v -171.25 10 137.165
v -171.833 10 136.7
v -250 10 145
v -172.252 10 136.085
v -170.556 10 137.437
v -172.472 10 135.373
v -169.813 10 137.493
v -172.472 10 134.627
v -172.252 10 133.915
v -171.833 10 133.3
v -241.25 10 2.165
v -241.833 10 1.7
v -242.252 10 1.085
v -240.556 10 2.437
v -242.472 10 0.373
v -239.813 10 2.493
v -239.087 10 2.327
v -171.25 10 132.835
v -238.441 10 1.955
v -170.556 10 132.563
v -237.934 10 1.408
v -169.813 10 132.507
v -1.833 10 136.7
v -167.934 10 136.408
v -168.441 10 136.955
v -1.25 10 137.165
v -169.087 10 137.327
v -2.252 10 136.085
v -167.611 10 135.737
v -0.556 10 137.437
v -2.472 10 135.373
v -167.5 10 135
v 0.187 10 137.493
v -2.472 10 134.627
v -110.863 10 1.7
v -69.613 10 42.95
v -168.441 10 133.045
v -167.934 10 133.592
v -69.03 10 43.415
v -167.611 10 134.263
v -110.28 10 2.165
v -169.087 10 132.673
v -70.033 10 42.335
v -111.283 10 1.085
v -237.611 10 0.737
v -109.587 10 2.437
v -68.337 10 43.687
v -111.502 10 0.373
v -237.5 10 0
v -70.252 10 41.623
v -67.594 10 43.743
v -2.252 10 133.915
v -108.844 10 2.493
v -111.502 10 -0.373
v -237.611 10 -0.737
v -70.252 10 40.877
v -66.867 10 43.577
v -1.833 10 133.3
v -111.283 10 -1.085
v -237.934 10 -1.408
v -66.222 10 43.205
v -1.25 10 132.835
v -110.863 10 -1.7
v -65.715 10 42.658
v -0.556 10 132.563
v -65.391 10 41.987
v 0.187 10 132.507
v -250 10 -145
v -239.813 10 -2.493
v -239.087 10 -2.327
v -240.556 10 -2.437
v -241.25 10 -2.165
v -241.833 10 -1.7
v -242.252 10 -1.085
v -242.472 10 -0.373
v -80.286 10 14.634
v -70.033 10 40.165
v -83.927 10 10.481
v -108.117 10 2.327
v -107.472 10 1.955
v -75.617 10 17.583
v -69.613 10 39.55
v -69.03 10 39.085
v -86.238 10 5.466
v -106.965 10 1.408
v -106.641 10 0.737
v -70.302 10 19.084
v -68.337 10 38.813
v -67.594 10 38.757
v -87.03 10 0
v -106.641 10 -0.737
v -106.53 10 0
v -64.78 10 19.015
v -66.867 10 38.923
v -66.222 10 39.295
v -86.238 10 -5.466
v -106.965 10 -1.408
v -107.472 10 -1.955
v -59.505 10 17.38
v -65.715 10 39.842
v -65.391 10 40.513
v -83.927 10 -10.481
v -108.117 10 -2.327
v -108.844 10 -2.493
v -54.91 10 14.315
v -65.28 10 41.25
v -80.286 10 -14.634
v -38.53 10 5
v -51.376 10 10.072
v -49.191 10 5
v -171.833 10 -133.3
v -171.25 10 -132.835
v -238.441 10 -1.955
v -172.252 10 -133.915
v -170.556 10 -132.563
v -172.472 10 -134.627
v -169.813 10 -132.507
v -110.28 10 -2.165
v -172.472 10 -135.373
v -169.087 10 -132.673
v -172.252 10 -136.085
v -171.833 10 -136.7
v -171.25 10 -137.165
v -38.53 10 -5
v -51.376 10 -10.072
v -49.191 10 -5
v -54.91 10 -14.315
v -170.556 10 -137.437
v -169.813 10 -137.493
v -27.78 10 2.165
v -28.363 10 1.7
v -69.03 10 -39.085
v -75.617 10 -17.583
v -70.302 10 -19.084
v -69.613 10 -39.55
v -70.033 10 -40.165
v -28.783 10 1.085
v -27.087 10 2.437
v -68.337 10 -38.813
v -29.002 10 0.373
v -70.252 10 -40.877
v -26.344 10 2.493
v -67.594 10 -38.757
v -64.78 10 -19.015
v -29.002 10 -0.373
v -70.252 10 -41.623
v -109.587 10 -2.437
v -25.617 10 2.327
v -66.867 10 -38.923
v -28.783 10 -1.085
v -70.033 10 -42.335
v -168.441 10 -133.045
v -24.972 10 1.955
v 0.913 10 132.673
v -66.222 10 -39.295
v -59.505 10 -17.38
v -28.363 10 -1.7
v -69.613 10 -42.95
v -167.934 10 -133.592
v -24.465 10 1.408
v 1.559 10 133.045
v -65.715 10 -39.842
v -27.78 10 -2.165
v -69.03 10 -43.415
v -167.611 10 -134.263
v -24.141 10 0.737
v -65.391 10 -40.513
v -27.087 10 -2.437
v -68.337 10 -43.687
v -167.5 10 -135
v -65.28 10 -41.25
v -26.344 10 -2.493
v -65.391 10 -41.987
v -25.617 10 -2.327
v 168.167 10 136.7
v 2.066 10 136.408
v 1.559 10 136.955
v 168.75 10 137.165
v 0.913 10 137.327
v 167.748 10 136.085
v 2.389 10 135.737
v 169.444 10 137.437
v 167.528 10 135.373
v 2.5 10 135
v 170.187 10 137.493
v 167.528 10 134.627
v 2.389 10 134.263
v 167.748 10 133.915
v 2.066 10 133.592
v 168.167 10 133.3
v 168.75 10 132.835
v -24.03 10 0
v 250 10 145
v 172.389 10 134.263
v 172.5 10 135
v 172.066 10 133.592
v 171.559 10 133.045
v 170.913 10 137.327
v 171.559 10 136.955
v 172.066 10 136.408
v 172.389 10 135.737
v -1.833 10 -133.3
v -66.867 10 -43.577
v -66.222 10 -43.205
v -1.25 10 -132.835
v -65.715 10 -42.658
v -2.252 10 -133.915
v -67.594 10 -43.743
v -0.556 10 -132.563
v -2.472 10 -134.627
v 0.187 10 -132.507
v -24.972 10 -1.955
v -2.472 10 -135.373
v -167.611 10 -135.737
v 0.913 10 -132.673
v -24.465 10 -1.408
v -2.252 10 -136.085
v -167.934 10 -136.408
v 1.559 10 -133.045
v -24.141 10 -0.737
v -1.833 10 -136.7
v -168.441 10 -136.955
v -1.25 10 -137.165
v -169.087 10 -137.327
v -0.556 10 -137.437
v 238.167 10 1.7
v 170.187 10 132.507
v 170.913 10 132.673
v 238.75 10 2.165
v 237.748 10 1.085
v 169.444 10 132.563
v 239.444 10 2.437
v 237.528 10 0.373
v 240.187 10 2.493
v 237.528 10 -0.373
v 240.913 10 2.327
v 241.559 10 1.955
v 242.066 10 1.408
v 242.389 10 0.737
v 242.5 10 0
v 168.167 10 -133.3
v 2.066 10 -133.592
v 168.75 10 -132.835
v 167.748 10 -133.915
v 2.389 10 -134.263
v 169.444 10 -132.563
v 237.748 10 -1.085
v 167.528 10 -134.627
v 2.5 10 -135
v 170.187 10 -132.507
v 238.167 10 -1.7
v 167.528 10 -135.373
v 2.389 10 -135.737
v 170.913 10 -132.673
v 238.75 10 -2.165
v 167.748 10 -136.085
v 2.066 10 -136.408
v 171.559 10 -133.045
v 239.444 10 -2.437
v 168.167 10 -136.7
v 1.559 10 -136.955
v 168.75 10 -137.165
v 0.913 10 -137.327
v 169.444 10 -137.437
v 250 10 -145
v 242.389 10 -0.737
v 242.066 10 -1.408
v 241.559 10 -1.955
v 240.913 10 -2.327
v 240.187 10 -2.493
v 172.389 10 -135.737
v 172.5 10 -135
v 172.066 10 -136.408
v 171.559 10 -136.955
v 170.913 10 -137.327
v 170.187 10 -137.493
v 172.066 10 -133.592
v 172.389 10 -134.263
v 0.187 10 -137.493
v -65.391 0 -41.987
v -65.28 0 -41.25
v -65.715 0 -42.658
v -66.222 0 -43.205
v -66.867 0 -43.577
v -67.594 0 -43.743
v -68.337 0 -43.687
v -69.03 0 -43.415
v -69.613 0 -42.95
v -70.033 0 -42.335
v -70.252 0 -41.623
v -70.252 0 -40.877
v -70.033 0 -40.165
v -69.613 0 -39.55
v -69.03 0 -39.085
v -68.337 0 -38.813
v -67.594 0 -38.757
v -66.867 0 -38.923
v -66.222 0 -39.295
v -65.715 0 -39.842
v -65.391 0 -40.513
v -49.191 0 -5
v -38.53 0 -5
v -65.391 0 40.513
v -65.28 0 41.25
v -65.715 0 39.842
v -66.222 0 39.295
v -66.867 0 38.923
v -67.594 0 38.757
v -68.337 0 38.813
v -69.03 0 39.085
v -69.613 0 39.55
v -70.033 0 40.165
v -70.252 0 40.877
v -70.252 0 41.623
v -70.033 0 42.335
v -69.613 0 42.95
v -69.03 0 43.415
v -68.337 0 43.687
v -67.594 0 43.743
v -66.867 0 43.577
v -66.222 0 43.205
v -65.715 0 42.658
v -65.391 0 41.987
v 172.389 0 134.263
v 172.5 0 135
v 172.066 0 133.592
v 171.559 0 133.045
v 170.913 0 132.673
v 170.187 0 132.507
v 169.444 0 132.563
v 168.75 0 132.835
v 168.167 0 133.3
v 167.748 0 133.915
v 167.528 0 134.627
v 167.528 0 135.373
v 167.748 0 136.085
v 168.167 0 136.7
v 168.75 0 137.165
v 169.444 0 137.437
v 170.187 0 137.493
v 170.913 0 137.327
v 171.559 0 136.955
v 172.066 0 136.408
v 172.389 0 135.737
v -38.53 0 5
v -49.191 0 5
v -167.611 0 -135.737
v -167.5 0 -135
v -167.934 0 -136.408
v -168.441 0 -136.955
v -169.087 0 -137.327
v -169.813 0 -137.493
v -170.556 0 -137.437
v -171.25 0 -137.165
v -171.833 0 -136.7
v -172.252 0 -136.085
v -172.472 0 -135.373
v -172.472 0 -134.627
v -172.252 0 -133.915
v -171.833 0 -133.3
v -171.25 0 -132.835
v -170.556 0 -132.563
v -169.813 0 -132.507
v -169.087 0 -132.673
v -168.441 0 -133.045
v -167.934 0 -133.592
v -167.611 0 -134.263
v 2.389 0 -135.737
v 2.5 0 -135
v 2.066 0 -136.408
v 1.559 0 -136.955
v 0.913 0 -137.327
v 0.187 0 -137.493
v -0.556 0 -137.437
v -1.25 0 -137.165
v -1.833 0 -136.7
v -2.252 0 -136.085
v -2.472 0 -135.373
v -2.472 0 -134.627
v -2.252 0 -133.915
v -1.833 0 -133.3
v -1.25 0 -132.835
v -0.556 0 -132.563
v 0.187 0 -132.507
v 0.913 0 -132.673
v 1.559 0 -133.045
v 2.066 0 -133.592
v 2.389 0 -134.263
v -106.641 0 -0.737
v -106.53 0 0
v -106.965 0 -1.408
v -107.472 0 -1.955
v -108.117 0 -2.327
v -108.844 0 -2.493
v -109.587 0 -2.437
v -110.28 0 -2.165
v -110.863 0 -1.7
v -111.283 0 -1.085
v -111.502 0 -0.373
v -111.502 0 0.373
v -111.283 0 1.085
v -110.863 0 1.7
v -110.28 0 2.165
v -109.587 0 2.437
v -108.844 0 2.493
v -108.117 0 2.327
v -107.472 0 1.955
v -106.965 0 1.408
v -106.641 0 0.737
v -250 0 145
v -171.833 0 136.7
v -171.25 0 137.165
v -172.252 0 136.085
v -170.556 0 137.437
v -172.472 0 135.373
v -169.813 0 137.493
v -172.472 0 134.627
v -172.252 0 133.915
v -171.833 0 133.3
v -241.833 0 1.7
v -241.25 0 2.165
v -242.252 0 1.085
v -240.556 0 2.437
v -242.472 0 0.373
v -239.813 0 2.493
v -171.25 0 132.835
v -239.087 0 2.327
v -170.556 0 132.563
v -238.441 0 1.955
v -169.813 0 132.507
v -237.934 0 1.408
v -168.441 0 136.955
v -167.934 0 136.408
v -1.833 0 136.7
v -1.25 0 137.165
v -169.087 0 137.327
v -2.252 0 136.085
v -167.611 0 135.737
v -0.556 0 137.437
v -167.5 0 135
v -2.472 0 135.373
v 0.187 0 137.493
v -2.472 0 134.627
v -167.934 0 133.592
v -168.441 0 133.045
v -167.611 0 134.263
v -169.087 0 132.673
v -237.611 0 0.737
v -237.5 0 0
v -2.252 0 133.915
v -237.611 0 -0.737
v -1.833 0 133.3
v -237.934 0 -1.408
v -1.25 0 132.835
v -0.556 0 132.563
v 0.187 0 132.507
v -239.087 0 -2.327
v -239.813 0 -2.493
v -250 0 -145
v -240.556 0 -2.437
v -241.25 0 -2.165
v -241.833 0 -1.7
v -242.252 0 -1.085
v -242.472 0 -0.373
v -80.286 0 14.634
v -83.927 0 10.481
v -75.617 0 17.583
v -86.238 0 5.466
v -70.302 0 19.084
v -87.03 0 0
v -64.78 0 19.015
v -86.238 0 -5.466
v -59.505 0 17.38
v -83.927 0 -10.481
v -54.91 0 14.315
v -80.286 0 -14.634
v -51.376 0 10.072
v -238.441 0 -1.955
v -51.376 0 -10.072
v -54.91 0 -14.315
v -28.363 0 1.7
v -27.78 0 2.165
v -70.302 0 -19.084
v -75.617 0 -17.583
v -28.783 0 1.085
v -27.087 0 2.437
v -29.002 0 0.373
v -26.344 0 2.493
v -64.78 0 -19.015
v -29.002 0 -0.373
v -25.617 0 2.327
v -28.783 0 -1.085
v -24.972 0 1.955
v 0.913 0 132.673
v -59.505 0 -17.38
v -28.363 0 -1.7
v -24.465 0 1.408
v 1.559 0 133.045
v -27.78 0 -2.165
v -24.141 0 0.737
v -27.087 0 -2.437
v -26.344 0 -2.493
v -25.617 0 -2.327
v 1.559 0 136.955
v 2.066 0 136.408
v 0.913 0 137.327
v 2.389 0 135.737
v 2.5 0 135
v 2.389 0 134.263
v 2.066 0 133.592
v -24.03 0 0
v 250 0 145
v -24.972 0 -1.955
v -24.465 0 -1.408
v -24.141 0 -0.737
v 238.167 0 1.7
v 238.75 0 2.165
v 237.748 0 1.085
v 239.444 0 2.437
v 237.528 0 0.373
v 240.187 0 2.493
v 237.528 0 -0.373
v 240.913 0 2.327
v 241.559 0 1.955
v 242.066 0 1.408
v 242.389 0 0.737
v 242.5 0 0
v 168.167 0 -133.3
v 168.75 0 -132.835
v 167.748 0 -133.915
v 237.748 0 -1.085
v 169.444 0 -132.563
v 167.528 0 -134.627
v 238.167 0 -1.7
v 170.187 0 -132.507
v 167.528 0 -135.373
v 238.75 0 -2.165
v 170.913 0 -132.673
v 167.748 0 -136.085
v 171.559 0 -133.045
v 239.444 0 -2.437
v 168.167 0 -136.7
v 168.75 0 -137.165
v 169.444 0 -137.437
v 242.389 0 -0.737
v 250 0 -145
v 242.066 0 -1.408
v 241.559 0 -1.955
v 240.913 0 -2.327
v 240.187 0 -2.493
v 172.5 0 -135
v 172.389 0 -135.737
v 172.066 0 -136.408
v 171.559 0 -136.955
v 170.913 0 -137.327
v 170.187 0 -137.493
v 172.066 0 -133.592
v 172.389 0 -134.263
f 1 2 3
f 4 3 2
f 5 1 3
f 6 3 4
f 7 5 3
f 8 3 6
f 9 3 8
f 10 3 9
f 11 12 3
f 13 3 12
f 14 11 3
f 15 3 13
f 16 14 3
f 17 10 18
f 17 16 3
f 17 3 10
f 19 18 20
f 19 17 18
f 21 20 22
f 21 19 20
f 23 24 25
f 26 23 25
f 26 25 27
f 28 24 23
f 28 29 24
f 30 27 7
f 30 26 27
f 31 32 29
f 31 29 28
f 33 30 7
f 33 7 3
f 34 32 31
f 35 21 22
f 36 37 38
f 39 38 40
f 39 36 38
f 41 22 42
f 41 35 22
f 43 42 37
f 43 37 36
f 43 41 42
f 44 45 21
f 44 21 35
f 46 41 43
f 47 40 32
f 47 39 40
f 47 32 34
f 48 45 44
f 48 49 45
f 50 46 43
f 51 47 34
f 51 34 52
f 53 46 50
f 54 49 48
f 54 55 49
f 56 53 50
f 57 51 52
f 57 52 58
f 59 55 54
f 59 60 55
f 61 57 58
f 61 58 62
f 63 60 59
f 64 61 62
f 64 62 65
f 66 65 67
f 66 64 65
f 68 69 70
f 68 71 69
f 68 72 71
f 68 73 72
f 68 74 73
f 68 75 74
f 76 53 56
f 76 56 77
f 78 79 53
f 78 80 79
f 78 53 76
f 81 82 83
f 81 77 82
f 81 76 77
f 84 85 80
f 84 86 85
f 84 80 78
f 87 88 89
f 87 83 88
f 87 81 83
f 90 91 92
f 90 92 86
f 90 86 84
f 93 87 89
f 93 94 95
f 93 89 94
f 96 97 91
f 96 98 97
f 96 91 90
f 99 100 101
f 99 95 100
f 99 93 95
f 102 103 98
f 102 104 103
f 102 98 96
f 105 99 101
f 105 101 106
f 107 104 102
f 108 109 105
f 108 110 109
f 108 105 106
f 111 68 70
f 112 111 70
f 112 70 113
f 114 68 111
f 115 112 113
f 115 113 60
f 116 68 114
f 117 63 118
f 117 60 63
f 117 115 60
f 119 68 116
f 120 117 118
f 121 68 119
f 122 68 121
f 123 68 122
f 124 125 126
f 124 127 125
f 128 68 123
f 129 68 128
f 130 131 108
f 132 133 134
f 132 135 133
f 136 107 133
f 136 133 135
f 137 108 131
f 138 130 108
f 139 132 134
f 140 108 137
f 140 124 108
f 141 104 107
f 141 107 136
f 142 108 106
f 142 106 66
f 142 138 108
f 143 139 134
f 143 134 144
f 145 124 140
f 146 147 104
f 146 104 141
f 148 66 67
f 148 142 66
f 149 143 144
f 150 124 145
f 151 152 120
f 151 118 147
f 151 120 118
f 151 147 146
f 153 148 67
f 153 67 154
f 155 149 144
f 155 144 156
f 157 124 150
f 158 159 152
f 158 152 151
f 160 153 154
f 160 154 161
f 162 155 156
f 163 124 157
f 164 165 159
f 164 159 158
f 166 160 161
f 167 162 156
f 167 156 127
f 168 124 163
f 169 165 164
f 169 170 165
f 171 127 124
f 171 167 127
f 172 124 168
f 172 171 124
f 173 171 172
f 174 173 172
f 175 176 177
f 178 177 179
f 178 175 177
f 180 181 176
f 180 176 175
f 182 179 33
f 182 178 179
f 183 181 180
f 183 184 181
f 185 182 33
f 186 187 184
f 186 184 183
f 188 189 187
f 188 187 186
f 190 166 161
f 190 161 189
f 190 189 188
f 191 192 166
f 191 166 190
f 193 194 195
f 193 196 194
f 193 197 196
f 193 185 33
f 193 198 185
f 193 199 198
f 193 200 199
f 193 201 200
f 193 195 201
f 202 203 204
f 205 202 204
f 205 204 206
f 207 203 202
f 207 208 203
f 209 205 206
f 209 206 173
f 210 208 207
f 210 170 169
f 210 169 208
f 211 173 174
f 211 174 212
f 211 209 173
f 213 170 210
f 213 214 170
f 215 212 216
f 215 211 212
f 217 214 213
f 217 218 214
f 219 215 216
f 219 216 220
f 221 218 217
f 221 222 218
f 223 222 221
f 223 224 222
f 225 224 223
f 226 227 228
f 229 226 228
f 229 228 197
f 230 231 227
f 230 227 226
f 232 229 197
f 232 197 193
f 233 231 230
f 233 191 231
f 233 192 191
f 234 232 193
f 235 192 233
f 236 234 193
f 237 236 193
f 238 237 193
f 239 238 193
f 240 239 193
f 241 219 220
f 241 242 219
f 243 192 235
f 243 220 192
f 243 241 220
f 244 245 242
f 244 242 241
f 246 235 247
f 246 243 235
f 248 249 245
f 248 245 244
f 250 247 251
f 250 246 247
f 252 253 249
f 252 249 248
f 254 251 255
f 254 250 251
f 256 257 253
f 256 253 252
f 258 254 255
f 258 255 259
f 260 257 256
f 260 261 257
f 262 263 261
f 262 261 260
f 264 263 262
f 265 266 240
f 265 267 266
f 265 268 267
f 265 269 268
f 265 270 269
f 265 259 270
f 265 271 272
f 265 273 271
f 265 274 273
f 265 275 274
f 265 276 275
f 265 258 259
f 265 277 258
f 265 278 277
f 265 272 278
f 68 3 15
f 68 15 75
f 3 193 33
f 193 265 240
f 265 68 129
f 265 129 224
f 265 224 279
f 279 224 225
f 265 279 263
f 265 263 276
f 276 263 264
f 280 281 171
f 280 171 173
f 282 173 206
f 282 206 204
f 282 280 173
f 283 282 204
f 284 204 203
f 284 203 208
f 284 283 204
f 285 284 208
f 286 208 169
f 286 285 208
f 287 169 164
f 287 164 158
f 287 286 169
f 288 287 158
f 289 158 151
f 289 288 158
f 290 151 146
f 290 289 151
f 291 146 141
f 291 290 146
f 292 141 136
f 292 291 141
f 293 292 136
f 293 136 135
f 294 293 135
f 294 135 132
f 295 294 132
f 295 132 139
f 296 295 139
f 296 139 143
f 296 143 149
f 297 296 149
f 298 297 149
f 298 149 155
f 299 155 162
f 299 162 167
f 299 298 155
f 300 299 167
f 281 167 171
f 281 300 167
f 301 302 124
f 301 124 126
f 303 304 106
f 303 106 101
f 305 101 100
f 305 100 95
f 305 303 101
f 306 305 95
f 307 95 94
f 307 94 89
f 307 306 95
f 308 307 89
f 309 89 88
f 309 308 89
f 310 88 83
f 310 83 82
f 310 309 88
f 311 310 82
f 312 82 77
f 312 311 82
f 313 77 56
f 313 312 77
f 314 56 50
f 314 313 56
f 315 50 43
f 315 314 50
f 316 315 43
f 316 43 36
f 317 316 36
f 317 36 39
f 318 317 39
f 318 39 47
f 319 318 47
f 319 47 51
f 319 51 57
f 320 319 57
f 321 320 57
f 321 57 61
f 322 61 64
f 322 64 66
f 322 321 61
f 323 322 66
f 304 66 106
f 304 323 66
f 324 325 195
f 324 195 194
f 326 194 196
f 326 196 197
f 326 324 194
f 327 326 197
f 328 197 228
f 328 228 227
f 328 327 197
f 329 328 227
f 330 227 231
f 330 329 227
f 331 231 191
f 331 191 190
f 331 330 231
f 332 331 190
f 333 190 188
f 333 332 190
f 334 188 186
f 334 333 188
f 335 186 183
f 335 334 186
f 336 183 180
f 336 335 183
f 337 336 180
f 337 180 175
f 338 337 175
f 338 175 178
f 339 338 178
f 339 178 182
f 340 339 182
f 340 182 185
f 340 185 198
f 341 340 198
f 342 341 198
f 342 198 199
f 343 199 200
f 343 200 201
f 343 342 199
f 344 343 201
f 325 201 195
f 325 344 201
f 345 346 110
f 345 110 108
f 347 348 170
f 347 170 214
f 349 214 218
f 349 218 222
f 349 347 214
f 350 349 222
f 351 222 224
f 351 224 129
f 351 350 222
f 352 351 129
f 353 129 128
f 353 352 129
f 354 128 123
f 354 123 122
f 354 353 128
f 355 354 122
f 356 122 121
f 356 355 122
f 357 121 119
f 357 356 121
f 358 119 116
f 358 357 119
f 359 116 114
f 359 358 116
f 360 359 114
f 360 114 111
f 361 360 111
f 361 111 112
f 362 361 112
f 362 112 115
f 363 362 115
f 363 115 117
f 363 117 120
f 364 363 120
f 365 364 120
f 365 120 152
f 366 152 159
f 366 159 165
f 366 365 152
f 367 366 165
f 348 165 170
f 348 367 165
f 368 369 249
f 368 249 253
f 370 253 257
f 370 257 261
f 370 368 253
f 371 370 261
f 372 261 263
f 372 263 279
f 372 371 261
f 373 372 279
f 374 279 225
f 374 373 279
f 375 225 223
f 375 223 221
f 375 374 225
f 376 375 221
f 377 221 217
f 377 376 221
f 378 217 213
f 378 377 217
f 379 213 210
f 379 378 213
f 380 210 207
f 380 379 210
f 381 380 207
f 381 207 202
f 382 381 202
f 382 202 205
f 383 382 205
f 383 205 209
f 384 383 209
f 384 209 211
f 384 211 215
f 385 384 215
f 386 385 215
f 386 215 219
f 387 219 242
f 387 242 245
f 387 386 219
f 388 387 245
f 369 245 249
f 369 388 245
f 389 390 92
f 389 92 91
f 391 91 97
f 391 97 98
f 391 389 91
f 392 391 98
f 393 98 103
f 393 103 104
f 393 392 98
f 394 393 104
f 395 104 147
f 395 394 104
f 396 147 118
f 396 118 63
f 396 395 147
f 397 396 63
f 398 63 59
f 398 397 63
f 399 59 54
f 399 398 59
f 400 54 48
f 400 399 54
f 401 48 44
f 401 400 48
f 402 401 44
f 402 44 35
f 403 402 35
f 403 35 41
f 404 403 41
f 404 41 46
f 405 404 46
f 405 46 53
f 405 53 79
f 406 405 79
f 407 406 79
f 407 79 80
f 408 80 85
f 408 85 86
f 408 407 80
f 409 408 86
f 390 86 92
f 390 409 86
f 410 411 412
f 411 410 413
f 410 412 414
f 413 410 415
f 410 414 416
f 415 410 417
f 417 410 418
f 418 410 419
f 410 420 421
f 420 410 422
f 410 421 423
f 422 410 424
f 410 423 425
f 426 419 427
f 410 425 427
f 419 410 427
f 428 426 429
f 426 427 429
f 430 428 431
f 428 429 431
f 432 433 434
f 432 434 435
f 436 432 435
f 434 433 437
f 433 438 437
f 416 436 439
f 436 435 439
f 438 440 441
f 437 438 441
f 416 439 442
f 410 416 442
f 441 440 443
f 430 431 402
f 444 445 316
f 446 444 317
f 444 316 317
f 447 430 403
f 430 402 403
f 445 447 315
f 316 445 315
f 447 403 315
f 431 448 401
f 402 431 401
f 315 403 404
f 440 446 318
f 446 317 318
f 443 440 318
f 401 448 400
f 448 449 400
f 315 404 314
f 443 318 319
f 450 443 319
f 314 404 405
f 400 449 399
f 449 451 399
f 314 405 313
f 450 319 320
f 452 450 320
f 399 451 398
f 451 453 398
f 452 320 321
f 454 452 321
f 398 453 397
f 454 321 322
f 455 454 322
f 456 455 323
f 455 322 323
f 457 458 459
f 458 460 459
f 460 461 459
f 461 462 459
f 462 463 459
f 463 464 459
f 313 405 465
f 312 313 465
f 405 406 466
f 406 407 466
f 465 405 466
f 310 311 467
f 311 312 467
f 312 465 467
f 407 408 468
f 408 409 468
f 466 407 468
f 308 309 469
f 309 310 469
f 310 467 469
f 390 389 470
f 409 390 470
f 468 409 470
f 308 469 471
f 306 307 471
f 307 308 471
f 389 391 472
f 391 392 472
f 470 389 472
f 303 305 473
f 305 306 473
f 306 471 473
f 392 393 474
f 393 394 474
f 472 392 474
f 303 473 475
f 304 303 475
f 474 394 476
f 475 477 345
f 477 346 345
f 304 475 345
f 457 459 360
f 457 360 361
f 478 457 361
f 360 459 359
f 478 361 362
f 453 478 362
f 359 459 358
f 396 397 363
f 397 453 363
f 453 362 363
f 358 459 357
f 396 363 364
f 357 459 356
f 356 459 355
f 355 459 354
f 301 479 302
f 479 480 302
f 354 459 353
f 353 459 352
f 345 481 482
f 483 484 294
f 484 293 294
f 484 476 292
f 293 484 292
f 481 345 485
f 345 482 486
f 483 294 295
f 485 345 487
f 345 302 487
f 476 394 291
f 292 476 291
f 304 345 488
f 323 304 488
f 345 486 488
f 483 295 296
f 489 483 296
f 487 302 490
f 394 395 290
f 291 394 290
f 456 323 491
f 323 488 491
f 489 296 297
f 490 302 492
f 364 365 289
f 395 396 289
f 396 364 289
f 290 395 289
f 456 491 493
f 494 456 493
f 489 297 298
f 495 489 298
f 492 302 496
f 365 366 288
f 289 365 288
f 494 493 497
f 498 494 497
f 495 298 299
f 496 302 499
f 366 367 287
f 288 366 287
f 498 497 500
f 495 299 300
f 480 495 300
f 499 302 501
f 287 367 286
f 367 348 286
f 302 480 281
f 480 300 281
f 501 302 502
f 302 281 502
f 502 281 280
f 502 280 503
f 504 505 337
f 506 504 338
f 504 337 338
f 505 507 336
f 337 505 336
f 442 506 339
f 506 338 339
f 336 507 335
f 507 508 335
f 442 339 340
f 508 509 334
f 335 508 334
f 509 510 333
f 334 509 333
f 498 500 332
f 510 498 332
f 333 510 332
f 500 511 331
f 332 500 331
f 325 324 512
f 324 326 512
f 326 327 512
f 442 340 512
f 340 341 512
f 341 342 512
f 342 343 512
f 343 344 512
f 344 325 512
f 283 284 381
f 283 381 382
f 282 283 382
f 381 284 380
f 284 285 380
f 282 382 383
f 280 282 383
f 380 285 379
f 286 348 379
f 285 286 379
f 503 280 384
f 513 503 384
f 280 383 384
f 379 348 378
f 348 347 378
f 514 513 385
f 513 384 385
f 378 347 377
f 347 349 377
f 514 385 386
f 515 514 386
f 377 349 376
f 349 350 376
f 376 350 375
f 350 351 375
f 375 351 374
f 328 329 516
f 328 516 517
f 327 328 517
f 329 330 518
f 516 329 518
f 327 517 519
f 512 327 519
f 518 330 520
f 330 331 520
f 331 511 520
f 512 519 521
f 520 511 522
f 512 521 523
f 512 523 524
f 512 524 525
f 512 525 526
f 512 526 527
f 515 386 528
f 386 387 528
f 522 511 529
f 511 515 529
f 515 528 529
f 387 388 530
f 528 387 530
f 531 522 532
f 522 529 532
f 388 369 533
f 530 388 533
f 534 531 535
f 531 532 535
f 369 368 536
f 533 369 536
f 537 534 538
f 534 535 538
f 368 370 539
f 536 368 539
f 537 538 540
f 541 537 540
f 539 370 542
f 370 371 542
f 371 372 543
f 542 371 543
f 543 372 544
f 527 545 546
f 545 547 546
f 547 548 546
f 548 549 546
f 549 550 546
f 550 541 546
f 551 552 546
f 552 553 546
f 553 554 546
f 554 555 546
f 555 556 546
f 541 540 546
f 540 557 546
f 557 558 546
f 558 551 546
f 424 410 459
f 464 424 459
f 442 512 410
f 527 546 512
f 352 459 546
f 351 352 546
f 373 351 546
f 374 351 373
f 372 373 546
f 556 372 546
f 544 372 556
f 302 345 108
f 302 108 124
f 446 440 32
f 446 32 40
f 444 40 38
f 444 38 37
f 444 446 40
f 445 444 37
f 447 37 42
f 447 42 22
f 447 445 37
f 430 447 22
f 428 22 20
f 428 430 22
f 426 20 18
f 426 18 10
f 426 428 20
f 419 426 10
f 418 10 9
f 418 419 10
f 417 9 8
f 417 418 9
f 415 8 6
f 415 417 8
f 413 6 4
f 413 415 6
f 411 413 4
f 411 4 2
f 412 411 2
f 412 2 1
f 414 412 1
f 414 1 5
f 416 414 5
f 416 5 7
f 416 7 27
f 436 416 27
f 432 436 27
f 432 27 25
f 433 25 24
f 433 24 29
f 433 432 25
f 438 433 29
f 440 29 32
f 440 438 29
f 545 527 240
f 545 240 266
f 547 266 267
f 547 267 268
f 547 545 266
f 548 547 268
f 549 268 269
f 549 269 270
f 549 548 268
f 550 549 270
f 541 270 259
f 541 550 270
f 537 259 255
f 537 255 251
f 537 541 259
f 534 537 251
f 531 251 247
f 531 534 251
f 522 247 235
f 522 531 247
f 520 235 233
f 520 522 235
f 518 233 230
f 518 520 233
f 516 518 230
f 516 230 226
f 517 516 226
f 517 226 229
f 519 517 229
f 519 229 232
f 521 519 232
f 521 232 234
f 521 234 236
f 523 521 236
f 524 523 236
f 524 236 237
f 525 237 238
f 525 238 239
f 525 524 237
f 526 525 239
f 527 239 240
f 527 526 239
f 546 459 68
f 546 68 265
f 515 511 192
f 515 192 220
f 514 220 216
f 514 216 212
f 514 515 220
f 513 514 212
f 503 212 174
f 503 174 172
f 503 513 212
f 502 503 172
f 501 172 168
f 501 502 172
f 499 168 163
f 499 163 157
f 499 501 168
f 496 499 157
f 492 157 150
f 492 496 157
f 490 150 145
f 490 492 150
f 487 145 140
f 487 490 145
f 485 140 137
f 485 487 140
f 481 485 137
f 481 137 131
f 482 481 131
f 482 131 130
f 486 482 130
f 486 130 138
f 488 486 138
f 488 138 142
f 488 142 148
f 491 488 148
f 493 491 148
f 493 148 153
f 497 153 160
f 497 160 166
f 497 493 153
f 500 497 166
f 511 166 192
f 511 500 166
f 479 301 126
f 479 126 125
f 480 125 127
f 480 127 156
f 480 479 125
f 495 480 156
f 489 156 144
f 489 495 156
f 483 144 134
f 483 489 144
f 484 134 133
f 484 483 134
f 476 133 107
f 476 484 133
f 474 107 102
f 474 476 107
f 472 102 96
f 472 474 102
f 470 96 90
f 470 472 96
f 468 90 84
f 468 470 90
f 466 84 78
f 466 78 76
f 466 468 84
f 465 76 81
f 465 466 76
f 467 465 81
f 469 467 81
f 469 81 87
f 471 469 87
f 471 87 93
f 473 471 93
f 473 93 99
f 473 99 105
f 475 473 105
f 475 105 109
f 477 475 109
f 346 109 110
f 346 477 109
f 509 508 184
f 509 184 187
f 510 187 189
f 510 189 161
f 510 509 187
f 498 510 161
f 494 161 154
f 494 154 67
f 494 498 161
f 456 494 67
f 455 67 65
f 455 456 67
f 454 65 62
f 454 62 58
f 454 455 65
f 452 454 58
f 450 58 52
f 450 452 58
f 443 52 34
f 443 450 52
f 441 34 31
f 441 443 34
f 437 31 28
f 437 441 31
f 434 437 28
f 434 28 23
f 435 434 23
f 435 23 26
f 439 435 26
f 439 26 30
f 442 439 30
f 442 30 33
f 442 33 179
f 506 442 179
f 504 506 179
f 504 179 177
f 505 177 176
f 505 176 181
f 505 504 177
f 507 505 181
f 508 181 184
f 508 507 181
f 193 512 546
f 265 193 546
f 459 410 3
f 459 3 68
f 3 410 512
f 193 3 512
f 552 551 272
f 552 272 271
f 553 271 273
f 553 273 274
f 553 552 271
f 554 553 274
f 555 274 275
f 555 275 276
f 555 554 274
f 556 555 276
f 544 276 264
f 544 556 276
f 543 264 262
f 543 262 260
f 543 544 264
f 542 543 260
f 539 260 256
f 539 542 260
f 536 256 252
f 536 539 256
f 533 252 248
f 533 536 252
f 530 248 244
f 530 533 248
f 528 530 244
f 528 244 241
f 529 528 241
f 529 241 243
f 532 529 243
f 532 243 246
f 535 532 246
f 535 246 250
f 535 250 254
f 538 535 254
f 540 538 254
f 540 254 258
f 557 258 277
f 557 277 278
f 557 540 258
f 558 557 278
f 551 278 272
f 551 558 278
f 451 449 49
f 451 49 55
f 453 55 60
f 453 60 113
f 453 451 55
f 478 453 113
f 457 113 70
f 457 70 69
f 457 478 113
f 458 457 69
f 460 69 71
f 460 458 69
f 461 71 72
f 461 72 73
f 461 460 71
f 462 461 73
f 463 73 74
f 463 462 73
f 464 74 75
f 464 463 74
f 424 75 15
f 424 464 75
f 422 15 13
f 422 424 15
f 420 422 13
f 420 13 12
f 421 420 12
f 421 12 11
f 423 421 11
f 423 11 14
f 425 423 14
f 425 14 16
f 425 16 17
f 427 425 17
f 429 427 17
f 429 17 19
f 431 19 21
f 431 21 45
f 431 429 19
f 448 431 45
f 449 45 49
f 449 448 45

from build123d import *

# Parameters (mm, degrees)
SKETCH1_W           = 500
SKETCH1_H           = 290
SKETCH1_R           = 2.5
BOSS_EXTRUDE1_DEPTH = 10


with BuildPart() as part:
    # Sketch1 → Boss-Extrude1 (new body)
    with BuildSketch(Plane(origin=(0, 0, 0), x_dir=(1, 0, 0), z_dir=(0, 1, 0))):
        Rectangle(SKETCH1_W, SKETCH1_H)
        with Locations((-240, 0)):
            Circle(SKETCH1_R, mode=Mode.SUBTRACT)
        with Locations((-170, -135)):
            Circle(SKETCH1_R, mode=Mode.SUBTRACT)
        with Locations((-170, 135)):
            Circle(SKETCH1_R, mode=Mode.SUBTRACT)
        with Locations((170, 135)):
            Circle(SKETCH1_R, mode=Mode.SUBTRACT)
        with Locations((240, 0)):
            Circle(SKETCH1_R, mode=Mode.SUBTRACT)
        with Locations((170, -135)):
            Circle(SKETCH1_R, mode=Mode.SUBTRACT)
        with Locations((0, 135)):
            Circle(SKETCH1_R, mode=Mode.SUBTRACT)
        with Locations((0, -135)):
            Circle(SKETCH1_R, mode=Mode.SUBTRACT)
        with Locations((-26.530336654, 0)):
            Circle(SKETCH1_R, mode=Mode.SUBTRACT)
        with Locations((-67.780336654, -41.25)):
            Circle(SKETCH1_R, mode=Mode.SUBTRACT)
        with Locations((-109.030336654, 0)):
            Circle(SKETCH1_R, mode=Mode.SUBTRACT)
        with Locations((-67.780336654, 41.25)):
            Circle(SKETCH1_R, mode=Mode.SUBTRACT)
        with BuildLine():
            Line((-49.191025209, -5), (-38.530336654, -5))
            Line((-38.530336654, -5), (-38.530336654, 5))
            Line((-38.530336654, 5), (-49.191025209, 5))
            ThreePointArc((-49.191025209, 5), (-87.030336654, 0), (-49.191025209, -5))
        make_face(mode=Mode.SUBTRACT)
    extrude(amount=BOSS_EXTRUDE1_DEPTH)


solid = part.part
